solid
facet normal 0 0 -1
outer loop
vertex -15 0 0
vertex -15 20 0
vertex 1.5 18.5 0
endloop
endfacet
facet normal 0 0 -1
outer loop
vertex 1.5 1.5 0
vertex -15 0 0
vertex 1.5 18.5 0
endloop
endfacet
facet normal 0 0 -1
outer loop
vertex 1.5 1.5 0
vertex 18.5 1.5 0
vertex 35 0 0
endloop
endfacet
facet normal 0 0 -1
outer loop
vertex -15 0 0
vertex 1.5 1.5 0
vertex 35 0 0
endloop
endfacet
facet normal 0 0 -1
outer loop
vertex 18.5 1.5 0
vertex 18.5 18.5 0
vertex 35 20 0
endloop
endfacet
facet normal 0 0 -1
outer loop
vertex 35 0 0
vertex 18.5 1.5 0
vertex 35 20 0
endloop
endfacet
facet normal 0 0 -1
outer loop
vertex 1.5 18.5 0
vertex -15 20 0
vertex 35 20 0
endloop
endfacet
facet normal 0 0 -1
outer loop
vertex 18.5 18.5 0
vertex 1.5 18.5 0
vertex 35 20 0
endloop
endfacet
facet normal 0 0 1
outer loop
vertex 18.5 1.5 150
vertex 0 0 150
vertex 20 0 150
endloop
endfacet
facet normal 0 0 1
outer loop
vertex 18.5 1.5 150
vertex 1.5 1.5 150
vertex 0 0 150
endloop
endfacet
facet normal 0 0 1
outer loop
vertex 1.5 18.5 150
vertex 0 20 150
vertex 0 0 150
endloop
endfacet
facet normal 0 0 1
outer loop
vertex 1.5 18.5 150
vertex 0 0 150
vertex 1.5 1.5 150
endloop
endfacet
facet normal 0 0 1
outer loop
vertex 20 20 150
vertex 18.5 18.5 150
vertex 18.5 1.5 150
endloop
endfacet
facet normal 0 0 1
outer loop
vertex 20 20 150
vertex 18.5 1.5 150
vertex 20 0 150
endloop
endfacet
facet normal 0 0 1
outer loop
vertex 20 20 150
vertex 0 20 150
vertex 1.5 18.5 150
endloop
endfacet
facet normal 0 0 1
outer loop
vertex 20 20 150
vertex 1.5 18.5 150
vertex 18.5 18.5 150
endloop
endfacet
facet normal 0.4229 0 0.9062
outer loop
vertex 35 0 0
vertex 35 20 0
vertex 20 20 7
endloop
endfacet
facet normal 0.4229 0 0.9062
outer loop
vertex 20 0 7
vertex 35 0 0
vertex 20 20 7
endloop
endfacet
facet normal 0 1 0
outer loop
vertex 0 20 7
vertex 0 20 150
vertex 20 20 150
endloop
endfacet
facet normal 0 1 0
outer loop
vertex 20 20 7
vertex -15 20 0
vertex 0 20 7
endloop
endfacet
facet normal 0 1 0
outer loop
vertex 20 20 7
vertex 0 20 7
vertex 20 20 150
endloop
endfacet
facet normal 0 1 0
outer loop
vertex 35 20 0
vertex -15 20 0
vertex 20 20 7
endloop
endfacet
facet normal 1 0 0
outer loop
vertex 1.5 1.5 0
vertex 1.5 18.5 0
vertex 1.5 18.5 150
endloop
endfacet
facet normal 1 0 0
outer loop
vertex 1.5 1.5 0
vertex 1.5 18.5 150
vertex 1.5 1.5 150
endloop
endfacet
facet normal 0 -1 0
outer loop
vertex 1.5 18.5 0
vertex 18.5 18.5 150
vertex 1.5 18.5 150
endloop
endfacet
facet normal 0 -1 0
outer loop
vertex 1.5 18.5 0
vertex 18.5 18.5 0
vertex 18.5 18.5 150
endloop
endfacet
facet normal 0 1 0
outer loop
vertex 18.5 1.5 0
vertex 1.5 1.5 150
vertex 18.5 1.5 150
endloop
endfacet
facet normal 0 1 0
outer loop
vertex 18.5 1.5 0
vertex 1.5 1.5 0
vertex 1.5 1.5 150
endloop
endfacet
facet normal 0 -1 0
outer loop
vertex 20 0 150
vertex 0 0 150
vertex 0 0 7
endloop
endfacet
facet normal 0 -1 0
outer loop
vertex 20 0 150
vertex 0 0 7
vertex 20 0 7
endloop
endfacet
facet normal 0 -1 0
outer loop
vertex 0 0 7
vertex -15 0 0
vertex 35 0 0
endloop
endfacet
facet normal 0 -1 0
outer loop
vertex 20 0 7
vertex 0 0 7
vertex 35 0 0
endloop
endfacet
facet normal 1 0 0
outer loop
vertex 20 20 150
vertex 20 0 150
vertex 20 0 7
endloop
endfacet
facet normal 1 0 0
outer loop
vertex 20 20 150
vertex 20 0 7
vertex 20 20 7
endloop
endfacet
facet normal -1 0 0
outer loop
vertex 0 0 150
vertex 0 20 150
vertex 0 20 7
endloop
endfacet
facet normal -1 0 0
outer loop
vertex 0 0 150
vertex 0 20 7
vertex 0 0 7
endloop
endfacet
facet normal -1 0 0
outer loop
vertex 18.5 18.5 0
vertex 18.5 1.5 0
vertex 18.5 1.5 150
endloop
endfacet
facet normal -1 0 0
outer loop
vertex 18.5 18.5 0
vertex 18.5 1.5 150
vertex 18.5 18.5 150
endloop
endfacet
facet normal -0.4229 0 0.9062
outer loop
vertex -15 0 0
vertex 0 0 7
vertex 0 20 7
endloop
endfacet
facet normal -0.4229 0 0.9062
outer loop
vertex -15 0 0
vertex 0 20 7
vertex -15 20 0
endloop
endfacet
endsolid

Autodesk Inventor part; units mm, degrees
ref_plane "YZ Plane" through (0, 0, 0) normal (1, 0, 0) x (0, 1, 0)
ref_plane "XZ Plane" through (0, 0, 0) normal (0, 1, 0) x (-1, 0, 0)
sketch "Эскиз1" plane through (0, 0, 0) normal (0, 0, 1) x (1, 0, 0)
  line L0 (0, 0) -> (20, 0)
  line L1 (20, 0) -> (20, 20)
  line L2 (20, 20) -> (0, 20)
  line L3 (0, 20) -> (0, 0)
  line L4 (1.5, 1.5) -> (18.5, 1.5)
  line L5 (18.5, 1.5) -> (18.5, 18.5)
  line L6 (18.5, 18.5) -> (1.5, 18.5)
  line L7 (1.5, 18.5) -> (1.5, 1.5)
  point P0 (10, 18.5)
  point P1 (10, 20)
  point P2 (18.5, 10)
  point P3 (20, 10)
  dimension "d0" = 20
  dimension "d1" = 1.5
extrude "Выдавливание1" add sketch "Эскиз1" along normal blind 150
sketch "Эскиз3" plane through (0, 20, 0) normal (0, 1, 0) x (1, 0, 0)
  line L0 (0, 0) -> (0, -150) projected
  line L1 (0, -7) -> (-15, 0)
  line L2 (-15, 0) -> (0, 0)
  line L3 (0, 0) -> (0, -7)
  line L4 (0, -7) -> (0, 0)
  dimension "d4" = 15
  dimension "d5" = 7
extrude "Выдавливание2" add sketch "Эскиз3" against normal up to surface (20 mm away)
ref_plane "РабПлоскость1" through (10, 0, 150) normal (-1, 0, 0) x (0, 0, 1)
mirror "Зеркальное отражение1" about plane through (10, 0, 150) normal (-1, 0, 0) of "Выдавливание2"
properties part number "shock_absorber_holder"
